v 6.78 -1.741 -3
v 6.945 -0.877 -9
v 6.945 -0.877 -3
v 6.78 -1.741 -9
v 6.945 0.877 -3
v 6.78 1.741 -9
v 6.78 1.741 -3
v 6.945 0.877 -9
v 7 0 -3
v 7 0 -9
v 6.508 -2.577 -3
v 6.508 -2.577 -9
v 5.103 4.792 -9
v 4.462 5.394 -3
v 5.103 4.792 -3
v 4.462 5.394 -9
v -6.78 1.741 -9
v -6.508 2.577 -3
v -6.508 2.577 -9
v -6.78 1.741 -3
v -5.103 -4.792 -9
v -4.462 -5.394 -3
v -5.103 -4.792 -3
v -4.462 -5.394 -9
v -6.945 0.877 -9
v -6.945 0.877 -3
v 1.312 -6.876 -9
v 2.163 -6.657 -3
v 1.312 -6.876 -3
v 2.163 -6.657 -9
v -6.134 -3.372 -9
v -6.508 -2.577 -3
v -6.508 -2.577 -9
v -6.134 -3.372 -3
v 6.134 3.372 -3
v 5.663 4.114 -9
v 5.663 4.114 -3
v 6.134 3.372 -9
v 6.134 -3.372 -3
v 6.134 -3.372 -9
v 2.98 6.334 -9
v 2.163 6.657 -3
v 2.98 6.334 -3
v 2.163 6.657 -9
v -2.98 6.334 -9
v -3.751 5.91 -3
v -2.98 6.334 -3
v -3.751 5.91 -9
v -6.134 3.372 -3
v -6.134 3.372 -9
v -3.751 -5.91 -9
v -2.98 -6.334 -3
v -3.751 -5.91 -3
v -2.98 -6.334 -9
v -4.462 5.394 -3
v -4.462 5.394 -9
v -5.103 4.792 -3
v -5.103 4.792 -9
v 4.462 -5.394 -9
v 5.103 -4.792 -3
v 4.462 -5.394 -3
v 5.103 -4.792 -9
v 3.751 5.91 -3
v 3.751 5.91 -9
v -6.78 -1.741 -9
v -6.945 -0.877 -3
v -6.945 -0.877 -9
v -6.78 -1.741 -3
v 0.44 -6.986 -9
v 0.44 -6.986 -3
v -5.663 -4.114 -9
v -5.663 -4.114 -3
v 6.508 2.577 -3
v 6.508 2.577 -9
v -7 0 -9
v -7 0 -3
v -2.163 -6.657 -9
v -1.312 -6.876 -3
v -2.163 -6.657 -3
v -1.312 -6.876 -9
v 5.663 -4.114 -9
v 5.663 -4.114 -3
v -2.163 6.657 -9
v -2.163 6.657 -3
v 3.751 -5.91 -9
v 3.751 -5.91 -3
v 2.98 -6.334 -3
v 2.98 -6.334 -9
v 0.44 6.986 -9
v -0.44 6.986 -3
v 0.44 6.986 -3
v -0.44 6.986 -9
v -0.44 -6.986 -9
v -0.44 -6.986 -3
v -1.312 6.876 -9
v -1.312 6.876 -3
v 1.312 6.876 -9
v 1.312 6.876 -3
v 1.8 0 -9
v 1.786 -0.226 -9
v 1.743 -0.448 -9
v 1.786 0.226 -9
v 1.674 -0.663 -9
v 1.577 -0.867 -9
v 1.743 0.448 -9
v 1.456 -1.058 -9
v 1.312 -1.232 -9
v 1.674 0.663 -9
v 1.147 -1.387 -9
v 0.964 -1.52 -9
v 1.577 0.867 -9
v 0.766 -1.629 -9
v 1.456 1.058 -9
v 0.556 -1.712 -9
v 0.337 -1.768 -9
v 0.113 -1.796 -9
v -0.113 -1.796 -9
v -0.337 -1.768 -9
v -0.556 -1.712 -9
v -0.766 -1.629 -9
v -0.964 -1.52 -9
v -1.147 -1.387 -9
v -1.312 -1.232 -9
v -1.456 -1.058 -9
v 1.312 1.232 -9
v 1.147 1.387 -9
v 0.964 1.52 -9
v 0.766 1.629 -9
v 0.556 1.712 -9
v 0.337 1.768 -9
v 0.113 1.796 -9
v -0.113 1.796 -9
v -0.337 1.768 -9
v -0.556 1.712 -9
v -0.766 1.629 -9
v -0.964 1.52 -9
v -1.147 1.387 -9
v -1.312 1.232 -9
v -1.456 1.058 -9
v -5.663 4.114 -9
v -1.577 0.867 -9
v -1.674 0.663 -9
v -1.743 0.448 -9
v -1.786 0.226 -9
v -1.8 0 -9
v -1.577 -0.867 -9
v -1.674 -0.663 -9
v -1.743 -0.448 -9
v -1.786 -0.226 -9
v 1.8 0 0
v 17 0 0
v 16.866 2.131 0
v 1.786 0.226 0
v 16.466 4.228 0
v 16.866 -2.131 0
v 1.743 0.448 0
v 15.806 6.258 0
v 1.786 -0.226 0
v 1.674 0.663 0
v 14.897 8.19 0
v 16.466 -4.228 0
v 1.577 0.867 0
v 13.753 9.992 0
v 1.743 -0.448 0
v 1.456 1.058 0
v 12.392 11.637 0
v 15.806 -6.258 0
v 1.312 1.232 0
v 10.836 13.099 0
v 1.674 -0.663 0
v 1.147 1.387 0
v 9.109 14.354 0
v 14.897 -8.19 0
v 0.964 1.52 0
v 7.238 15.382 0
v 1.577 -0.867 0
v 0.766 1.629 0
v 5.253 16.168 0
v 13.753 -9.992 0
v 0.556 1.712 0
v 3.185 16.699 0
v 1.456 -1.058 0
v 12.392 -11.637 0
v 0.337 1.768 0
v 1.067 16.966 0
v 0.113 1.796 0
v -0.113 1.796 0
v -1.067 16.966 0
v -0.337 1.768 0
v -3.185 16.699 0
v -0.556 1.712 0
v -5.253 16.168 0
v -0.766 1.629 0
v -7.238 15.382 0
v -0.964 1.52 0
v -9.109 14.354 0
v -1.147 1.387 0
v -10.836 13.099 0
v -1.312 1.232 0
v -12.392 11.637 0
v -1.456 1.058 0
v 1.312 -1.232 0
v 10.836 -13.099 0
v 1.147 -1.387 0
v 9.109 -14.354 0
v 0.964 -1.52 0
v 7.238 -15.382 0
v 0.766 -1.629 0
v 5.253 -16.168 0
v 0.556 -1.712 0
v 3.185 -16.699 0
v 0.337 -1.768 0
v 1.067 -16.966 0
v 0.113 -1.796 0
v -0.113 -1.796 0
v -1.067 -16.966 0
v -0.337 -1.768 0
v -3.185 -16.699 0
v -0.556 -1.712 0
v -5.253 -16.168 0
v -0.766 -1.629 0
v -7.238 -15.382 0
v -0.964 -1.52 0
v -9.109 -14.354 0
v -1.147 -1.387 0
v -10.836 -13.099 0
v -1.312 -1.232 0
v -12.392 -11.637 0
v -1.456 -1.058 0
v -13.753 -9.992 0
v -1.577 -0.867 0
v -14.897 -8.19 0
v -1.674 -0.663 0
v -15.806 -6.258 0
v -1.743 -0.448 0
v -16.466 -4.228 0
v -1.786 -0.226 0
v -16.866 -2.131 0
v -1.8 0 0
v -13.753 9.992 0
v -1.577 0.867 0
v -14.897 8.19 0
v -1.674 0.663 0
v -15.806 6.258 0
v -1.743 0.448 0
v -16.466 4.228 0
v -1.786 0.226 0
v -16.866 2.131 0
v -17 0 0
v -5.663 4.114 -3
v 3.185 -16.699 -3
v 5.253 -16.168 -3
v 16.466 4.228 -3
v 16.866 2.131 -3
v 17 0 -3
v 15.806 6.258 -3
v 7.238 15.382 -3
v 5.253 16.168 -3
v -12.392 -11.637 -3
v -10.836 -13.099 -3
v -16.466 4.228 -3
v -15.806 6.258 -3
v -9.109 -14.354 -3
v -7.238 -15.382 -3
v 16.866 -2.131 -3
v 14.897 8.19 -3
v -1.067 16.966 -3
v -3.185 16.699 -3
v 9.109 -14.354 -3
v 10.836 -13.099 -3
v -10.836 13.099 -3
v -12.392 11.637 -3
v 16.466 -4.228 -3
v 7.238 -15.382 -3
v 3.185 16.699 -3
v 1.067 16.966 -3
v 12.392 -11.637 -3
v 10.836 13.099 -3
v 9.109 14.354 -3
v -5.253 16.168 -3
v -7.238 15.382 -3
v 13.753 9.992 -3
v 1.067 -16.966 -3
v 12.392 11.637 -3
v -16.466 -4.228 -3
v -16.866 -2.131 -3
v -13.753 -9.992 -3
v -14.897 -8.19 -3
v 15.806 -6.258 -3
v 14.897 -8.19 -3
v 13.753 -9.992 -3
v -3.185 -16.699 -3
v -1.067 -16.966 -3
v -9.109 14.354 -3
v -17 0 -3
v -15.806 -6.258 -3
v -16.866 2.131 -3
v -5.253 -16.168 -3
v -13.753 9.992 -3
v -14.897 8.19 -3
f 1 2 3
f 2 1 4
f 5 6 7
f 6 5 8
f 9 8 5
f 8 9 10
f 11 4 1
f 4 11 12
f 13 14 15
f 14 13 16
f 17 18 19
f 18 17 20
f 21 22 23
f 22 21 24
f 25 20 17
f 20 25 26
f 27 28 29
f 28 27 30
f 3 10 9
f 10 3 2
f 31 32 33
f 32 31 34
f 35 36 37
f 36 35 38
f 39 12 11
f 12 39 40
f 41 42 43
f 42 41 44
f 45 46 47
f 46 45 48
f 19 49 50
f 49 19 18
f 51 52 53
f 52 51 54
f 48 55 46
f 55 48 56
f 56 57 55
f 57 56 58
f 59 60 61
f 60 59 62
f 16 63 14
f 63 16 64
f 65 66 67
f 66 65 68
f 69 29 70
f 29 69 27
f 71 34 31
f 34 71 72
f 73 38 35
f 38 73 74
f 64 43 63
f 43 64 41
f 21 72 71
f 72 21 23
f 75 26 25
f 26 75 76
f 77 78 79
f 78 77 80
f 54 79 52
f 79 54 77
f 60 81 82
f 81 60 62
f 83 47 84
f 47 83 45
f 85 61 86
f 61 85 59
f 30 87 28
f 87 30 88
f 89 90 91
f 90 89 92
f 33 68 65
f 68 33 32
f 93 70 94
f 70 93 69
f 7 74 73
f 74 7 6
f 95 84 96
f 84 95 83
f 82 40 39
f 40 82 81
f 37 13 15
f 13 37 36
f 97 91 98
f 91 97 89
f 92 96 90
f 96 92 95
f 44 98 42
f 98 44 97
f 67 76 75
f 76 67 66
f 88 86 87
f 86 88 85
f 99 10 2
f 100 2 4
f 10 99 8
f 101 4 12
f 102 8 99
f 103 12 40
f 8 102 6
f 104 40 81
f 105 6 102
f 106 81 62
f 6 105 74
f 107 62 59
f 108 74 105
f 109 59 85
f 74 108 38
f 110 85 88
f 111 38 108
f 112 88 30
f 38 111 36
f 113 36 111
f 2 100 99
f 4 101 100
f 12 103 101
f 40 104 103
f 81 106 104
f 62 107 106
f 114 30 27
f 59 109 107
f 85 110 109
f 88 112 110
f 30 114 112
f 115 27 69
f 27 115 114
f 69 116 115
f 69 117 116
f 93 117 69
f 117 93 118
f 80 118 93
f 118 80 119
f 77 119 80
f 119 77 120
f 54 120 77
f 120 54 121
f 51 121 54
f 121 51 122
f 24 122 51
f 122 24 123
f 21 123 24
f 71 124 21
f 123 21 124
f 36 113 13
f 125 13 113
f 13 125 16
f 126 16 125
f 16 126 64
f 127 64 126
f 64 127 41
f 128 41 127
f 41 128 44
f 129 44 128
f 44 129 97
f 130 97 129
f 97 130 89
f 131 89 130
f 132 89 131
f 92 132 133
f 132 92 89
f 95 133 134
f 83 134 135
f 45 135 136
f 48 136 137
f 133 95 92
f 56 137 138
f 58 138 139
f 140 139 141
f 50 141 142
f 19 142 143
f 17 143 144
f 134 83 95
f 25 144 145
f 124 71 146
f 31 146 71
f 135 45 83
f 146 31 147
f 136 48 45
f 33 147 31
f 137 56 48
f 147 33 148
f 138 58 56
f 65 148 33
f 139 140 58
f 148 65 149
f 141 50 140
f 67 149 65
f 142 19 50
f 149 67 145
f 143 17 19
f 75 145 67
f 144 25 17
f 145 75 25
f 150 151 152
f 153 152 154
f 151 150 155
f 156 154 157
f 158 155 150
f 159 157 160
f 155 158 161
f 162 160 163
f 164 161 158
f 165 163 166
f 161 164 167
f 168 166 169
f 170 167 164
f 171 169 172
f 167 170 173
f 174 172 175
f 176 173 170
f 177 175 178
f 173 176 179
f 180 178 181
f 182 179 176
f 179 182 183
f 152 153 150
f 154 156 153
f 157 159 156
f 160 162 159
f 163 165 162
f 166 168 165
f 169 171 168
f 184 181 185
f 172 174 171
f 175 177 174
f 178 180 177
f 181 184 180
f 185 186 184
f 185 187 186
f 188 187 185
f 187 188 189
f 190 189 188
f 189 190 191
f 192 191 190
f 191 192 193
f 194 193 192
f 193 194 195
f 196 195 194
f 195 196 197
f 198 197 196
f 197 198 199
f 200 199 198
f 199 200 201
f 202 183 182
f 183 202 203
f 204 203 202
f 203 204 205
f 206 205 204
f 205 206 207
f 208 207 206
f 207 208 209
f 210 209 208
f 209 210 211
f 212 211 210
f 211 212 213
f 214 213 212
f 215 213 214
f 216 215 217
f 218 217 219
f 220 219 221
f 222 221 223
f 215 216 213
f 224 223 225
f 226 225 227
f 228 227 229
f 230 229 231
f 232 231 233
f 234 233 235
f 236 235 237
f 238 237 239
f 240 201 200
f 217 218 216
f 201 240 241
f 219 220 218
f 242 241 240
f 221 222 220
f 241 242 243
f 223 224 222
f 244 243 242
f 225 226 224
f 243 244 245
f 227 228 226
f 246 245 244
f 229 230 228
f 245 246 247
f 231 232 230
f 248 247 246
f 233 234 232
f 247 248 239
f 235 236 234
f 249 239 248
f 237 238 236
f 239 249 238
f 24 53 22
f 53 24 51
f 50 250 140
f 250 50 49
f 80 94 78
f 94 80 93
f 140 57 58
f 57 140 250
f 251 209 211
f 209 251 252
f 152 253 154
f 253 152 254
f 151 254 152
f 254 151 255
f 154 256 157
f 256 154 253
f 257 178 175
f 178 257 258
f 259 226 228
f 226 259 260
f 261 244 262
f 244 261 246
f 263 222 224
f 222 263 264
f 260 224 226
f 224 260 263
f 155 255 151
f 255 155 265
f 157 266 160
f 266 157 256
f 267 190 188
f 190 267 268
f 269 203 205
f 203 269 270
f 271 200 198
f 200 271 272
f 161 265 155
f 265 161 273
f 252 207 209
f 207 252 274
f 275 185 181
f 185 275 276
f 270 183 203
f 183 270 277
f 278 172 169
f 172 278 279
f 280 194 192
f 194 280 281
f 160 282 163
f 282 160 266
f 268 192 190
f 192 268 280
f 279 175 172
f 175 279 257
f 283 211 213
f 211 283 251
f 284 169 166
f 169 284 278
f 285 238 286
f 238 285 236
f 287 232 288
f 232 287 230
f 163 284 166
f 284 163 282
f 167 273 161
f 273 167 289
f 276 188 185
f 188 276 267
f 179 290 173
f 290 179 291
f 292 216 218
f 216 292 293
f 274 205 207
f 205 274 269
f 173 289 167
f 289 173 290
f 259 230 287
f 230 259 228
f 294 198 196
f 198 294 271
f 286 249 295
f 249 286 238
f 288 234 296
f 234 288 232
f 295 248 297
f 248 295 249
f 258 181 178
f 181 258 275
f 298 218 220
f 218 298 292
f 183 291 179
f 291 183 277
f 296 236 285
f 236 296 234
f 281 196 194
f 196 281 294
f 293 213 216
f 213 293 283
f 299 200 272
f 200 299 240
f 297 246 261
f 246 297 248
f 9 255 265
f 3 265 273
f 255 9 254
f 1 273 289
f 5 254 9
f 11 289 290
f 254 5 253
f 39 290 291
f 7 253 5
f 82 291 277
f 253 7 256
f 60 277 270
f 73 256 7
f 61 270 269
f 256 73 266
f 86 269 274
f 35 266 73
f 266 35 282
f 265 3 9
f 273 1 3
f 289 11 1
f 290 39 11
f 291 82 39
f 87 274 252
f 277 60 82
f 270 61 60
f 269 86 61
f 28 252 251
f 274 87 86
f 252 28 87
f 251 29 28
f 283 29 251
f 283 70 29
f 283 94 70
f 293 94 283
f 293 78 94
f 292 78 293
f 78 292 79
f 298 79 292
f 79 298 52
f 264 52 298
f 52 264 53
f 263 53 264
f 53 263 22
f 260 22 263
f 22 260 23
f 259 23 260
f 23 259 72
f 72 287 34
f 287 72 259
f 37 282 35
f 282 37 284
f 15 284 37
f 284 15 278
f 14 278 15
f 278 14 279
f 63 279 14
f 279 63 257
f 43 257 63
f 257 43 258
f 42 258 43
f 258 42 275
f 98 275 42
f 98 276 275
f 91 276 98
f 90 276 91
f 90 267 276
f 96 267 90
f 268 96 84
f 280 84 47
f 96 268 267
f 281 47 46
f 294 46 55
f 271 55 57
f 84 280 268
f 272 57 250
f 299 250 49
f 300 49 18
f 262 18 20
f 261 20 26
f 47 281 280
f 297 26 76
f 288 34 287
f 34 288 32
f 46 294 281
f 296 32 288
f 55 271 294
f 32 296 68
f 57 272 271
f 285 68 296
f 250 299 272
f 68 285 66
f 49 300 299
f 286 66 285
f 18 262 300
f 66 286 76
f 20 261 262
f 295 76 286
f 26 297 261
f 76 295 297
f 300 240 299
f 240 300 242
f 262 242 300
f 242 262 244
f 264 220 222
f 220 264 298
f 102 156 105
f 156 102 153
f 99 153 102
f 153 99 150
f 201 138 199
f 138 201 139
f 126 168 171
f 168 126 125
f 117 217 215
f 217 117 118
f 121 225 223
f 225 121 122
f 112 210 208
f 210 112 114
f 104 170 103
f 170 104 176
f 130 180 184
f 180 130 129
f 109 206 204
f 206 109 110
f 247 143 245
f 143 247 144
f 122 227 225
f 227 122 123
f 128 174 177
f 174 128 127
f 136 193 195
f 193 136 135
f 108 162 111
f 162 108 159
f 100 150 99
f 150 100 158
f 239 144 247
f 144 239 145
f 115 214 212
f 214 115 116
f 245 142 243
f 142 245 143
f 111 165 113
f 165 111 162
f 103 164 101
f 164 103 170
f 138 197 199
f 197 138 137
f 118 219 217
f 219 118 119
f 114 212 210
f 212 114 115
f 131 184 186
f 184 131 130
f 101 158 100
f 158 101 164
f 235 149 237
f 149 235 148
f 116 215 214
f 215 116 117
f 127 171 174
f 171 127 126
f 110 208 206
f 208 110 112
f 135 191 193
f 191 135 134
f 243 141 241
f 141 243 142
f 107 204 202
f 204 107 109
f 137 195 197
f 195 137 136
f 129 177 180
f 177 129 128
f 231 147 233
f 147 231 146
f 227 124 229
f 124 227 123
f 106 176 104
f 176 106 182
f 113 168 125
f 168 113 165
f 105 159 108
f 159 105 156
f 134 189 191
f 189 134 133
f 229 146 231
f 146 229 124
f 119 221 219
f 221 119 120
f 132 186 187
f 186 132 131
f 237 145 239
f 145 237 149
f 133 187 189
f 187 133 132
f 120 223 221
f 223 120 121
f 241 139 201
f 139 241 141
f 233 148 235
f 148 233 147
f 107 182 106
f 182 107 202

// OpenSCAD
$fn = 50;


difference() {
	union() {
		translate(v = [0, 0, -9.0000000000]) {
			cylinder(h = 9, r = 7.0000000000);
		}
		translate(v = [0, 0, -3.0000000000]) {
			cylinder(h = 3, r = 17.0000000000);
		}
	}
	union() {
		#translate(v = [0, 0, -9]) {
			cylinder(h = 9, r = 1.8000000000);
		}
	}
}
